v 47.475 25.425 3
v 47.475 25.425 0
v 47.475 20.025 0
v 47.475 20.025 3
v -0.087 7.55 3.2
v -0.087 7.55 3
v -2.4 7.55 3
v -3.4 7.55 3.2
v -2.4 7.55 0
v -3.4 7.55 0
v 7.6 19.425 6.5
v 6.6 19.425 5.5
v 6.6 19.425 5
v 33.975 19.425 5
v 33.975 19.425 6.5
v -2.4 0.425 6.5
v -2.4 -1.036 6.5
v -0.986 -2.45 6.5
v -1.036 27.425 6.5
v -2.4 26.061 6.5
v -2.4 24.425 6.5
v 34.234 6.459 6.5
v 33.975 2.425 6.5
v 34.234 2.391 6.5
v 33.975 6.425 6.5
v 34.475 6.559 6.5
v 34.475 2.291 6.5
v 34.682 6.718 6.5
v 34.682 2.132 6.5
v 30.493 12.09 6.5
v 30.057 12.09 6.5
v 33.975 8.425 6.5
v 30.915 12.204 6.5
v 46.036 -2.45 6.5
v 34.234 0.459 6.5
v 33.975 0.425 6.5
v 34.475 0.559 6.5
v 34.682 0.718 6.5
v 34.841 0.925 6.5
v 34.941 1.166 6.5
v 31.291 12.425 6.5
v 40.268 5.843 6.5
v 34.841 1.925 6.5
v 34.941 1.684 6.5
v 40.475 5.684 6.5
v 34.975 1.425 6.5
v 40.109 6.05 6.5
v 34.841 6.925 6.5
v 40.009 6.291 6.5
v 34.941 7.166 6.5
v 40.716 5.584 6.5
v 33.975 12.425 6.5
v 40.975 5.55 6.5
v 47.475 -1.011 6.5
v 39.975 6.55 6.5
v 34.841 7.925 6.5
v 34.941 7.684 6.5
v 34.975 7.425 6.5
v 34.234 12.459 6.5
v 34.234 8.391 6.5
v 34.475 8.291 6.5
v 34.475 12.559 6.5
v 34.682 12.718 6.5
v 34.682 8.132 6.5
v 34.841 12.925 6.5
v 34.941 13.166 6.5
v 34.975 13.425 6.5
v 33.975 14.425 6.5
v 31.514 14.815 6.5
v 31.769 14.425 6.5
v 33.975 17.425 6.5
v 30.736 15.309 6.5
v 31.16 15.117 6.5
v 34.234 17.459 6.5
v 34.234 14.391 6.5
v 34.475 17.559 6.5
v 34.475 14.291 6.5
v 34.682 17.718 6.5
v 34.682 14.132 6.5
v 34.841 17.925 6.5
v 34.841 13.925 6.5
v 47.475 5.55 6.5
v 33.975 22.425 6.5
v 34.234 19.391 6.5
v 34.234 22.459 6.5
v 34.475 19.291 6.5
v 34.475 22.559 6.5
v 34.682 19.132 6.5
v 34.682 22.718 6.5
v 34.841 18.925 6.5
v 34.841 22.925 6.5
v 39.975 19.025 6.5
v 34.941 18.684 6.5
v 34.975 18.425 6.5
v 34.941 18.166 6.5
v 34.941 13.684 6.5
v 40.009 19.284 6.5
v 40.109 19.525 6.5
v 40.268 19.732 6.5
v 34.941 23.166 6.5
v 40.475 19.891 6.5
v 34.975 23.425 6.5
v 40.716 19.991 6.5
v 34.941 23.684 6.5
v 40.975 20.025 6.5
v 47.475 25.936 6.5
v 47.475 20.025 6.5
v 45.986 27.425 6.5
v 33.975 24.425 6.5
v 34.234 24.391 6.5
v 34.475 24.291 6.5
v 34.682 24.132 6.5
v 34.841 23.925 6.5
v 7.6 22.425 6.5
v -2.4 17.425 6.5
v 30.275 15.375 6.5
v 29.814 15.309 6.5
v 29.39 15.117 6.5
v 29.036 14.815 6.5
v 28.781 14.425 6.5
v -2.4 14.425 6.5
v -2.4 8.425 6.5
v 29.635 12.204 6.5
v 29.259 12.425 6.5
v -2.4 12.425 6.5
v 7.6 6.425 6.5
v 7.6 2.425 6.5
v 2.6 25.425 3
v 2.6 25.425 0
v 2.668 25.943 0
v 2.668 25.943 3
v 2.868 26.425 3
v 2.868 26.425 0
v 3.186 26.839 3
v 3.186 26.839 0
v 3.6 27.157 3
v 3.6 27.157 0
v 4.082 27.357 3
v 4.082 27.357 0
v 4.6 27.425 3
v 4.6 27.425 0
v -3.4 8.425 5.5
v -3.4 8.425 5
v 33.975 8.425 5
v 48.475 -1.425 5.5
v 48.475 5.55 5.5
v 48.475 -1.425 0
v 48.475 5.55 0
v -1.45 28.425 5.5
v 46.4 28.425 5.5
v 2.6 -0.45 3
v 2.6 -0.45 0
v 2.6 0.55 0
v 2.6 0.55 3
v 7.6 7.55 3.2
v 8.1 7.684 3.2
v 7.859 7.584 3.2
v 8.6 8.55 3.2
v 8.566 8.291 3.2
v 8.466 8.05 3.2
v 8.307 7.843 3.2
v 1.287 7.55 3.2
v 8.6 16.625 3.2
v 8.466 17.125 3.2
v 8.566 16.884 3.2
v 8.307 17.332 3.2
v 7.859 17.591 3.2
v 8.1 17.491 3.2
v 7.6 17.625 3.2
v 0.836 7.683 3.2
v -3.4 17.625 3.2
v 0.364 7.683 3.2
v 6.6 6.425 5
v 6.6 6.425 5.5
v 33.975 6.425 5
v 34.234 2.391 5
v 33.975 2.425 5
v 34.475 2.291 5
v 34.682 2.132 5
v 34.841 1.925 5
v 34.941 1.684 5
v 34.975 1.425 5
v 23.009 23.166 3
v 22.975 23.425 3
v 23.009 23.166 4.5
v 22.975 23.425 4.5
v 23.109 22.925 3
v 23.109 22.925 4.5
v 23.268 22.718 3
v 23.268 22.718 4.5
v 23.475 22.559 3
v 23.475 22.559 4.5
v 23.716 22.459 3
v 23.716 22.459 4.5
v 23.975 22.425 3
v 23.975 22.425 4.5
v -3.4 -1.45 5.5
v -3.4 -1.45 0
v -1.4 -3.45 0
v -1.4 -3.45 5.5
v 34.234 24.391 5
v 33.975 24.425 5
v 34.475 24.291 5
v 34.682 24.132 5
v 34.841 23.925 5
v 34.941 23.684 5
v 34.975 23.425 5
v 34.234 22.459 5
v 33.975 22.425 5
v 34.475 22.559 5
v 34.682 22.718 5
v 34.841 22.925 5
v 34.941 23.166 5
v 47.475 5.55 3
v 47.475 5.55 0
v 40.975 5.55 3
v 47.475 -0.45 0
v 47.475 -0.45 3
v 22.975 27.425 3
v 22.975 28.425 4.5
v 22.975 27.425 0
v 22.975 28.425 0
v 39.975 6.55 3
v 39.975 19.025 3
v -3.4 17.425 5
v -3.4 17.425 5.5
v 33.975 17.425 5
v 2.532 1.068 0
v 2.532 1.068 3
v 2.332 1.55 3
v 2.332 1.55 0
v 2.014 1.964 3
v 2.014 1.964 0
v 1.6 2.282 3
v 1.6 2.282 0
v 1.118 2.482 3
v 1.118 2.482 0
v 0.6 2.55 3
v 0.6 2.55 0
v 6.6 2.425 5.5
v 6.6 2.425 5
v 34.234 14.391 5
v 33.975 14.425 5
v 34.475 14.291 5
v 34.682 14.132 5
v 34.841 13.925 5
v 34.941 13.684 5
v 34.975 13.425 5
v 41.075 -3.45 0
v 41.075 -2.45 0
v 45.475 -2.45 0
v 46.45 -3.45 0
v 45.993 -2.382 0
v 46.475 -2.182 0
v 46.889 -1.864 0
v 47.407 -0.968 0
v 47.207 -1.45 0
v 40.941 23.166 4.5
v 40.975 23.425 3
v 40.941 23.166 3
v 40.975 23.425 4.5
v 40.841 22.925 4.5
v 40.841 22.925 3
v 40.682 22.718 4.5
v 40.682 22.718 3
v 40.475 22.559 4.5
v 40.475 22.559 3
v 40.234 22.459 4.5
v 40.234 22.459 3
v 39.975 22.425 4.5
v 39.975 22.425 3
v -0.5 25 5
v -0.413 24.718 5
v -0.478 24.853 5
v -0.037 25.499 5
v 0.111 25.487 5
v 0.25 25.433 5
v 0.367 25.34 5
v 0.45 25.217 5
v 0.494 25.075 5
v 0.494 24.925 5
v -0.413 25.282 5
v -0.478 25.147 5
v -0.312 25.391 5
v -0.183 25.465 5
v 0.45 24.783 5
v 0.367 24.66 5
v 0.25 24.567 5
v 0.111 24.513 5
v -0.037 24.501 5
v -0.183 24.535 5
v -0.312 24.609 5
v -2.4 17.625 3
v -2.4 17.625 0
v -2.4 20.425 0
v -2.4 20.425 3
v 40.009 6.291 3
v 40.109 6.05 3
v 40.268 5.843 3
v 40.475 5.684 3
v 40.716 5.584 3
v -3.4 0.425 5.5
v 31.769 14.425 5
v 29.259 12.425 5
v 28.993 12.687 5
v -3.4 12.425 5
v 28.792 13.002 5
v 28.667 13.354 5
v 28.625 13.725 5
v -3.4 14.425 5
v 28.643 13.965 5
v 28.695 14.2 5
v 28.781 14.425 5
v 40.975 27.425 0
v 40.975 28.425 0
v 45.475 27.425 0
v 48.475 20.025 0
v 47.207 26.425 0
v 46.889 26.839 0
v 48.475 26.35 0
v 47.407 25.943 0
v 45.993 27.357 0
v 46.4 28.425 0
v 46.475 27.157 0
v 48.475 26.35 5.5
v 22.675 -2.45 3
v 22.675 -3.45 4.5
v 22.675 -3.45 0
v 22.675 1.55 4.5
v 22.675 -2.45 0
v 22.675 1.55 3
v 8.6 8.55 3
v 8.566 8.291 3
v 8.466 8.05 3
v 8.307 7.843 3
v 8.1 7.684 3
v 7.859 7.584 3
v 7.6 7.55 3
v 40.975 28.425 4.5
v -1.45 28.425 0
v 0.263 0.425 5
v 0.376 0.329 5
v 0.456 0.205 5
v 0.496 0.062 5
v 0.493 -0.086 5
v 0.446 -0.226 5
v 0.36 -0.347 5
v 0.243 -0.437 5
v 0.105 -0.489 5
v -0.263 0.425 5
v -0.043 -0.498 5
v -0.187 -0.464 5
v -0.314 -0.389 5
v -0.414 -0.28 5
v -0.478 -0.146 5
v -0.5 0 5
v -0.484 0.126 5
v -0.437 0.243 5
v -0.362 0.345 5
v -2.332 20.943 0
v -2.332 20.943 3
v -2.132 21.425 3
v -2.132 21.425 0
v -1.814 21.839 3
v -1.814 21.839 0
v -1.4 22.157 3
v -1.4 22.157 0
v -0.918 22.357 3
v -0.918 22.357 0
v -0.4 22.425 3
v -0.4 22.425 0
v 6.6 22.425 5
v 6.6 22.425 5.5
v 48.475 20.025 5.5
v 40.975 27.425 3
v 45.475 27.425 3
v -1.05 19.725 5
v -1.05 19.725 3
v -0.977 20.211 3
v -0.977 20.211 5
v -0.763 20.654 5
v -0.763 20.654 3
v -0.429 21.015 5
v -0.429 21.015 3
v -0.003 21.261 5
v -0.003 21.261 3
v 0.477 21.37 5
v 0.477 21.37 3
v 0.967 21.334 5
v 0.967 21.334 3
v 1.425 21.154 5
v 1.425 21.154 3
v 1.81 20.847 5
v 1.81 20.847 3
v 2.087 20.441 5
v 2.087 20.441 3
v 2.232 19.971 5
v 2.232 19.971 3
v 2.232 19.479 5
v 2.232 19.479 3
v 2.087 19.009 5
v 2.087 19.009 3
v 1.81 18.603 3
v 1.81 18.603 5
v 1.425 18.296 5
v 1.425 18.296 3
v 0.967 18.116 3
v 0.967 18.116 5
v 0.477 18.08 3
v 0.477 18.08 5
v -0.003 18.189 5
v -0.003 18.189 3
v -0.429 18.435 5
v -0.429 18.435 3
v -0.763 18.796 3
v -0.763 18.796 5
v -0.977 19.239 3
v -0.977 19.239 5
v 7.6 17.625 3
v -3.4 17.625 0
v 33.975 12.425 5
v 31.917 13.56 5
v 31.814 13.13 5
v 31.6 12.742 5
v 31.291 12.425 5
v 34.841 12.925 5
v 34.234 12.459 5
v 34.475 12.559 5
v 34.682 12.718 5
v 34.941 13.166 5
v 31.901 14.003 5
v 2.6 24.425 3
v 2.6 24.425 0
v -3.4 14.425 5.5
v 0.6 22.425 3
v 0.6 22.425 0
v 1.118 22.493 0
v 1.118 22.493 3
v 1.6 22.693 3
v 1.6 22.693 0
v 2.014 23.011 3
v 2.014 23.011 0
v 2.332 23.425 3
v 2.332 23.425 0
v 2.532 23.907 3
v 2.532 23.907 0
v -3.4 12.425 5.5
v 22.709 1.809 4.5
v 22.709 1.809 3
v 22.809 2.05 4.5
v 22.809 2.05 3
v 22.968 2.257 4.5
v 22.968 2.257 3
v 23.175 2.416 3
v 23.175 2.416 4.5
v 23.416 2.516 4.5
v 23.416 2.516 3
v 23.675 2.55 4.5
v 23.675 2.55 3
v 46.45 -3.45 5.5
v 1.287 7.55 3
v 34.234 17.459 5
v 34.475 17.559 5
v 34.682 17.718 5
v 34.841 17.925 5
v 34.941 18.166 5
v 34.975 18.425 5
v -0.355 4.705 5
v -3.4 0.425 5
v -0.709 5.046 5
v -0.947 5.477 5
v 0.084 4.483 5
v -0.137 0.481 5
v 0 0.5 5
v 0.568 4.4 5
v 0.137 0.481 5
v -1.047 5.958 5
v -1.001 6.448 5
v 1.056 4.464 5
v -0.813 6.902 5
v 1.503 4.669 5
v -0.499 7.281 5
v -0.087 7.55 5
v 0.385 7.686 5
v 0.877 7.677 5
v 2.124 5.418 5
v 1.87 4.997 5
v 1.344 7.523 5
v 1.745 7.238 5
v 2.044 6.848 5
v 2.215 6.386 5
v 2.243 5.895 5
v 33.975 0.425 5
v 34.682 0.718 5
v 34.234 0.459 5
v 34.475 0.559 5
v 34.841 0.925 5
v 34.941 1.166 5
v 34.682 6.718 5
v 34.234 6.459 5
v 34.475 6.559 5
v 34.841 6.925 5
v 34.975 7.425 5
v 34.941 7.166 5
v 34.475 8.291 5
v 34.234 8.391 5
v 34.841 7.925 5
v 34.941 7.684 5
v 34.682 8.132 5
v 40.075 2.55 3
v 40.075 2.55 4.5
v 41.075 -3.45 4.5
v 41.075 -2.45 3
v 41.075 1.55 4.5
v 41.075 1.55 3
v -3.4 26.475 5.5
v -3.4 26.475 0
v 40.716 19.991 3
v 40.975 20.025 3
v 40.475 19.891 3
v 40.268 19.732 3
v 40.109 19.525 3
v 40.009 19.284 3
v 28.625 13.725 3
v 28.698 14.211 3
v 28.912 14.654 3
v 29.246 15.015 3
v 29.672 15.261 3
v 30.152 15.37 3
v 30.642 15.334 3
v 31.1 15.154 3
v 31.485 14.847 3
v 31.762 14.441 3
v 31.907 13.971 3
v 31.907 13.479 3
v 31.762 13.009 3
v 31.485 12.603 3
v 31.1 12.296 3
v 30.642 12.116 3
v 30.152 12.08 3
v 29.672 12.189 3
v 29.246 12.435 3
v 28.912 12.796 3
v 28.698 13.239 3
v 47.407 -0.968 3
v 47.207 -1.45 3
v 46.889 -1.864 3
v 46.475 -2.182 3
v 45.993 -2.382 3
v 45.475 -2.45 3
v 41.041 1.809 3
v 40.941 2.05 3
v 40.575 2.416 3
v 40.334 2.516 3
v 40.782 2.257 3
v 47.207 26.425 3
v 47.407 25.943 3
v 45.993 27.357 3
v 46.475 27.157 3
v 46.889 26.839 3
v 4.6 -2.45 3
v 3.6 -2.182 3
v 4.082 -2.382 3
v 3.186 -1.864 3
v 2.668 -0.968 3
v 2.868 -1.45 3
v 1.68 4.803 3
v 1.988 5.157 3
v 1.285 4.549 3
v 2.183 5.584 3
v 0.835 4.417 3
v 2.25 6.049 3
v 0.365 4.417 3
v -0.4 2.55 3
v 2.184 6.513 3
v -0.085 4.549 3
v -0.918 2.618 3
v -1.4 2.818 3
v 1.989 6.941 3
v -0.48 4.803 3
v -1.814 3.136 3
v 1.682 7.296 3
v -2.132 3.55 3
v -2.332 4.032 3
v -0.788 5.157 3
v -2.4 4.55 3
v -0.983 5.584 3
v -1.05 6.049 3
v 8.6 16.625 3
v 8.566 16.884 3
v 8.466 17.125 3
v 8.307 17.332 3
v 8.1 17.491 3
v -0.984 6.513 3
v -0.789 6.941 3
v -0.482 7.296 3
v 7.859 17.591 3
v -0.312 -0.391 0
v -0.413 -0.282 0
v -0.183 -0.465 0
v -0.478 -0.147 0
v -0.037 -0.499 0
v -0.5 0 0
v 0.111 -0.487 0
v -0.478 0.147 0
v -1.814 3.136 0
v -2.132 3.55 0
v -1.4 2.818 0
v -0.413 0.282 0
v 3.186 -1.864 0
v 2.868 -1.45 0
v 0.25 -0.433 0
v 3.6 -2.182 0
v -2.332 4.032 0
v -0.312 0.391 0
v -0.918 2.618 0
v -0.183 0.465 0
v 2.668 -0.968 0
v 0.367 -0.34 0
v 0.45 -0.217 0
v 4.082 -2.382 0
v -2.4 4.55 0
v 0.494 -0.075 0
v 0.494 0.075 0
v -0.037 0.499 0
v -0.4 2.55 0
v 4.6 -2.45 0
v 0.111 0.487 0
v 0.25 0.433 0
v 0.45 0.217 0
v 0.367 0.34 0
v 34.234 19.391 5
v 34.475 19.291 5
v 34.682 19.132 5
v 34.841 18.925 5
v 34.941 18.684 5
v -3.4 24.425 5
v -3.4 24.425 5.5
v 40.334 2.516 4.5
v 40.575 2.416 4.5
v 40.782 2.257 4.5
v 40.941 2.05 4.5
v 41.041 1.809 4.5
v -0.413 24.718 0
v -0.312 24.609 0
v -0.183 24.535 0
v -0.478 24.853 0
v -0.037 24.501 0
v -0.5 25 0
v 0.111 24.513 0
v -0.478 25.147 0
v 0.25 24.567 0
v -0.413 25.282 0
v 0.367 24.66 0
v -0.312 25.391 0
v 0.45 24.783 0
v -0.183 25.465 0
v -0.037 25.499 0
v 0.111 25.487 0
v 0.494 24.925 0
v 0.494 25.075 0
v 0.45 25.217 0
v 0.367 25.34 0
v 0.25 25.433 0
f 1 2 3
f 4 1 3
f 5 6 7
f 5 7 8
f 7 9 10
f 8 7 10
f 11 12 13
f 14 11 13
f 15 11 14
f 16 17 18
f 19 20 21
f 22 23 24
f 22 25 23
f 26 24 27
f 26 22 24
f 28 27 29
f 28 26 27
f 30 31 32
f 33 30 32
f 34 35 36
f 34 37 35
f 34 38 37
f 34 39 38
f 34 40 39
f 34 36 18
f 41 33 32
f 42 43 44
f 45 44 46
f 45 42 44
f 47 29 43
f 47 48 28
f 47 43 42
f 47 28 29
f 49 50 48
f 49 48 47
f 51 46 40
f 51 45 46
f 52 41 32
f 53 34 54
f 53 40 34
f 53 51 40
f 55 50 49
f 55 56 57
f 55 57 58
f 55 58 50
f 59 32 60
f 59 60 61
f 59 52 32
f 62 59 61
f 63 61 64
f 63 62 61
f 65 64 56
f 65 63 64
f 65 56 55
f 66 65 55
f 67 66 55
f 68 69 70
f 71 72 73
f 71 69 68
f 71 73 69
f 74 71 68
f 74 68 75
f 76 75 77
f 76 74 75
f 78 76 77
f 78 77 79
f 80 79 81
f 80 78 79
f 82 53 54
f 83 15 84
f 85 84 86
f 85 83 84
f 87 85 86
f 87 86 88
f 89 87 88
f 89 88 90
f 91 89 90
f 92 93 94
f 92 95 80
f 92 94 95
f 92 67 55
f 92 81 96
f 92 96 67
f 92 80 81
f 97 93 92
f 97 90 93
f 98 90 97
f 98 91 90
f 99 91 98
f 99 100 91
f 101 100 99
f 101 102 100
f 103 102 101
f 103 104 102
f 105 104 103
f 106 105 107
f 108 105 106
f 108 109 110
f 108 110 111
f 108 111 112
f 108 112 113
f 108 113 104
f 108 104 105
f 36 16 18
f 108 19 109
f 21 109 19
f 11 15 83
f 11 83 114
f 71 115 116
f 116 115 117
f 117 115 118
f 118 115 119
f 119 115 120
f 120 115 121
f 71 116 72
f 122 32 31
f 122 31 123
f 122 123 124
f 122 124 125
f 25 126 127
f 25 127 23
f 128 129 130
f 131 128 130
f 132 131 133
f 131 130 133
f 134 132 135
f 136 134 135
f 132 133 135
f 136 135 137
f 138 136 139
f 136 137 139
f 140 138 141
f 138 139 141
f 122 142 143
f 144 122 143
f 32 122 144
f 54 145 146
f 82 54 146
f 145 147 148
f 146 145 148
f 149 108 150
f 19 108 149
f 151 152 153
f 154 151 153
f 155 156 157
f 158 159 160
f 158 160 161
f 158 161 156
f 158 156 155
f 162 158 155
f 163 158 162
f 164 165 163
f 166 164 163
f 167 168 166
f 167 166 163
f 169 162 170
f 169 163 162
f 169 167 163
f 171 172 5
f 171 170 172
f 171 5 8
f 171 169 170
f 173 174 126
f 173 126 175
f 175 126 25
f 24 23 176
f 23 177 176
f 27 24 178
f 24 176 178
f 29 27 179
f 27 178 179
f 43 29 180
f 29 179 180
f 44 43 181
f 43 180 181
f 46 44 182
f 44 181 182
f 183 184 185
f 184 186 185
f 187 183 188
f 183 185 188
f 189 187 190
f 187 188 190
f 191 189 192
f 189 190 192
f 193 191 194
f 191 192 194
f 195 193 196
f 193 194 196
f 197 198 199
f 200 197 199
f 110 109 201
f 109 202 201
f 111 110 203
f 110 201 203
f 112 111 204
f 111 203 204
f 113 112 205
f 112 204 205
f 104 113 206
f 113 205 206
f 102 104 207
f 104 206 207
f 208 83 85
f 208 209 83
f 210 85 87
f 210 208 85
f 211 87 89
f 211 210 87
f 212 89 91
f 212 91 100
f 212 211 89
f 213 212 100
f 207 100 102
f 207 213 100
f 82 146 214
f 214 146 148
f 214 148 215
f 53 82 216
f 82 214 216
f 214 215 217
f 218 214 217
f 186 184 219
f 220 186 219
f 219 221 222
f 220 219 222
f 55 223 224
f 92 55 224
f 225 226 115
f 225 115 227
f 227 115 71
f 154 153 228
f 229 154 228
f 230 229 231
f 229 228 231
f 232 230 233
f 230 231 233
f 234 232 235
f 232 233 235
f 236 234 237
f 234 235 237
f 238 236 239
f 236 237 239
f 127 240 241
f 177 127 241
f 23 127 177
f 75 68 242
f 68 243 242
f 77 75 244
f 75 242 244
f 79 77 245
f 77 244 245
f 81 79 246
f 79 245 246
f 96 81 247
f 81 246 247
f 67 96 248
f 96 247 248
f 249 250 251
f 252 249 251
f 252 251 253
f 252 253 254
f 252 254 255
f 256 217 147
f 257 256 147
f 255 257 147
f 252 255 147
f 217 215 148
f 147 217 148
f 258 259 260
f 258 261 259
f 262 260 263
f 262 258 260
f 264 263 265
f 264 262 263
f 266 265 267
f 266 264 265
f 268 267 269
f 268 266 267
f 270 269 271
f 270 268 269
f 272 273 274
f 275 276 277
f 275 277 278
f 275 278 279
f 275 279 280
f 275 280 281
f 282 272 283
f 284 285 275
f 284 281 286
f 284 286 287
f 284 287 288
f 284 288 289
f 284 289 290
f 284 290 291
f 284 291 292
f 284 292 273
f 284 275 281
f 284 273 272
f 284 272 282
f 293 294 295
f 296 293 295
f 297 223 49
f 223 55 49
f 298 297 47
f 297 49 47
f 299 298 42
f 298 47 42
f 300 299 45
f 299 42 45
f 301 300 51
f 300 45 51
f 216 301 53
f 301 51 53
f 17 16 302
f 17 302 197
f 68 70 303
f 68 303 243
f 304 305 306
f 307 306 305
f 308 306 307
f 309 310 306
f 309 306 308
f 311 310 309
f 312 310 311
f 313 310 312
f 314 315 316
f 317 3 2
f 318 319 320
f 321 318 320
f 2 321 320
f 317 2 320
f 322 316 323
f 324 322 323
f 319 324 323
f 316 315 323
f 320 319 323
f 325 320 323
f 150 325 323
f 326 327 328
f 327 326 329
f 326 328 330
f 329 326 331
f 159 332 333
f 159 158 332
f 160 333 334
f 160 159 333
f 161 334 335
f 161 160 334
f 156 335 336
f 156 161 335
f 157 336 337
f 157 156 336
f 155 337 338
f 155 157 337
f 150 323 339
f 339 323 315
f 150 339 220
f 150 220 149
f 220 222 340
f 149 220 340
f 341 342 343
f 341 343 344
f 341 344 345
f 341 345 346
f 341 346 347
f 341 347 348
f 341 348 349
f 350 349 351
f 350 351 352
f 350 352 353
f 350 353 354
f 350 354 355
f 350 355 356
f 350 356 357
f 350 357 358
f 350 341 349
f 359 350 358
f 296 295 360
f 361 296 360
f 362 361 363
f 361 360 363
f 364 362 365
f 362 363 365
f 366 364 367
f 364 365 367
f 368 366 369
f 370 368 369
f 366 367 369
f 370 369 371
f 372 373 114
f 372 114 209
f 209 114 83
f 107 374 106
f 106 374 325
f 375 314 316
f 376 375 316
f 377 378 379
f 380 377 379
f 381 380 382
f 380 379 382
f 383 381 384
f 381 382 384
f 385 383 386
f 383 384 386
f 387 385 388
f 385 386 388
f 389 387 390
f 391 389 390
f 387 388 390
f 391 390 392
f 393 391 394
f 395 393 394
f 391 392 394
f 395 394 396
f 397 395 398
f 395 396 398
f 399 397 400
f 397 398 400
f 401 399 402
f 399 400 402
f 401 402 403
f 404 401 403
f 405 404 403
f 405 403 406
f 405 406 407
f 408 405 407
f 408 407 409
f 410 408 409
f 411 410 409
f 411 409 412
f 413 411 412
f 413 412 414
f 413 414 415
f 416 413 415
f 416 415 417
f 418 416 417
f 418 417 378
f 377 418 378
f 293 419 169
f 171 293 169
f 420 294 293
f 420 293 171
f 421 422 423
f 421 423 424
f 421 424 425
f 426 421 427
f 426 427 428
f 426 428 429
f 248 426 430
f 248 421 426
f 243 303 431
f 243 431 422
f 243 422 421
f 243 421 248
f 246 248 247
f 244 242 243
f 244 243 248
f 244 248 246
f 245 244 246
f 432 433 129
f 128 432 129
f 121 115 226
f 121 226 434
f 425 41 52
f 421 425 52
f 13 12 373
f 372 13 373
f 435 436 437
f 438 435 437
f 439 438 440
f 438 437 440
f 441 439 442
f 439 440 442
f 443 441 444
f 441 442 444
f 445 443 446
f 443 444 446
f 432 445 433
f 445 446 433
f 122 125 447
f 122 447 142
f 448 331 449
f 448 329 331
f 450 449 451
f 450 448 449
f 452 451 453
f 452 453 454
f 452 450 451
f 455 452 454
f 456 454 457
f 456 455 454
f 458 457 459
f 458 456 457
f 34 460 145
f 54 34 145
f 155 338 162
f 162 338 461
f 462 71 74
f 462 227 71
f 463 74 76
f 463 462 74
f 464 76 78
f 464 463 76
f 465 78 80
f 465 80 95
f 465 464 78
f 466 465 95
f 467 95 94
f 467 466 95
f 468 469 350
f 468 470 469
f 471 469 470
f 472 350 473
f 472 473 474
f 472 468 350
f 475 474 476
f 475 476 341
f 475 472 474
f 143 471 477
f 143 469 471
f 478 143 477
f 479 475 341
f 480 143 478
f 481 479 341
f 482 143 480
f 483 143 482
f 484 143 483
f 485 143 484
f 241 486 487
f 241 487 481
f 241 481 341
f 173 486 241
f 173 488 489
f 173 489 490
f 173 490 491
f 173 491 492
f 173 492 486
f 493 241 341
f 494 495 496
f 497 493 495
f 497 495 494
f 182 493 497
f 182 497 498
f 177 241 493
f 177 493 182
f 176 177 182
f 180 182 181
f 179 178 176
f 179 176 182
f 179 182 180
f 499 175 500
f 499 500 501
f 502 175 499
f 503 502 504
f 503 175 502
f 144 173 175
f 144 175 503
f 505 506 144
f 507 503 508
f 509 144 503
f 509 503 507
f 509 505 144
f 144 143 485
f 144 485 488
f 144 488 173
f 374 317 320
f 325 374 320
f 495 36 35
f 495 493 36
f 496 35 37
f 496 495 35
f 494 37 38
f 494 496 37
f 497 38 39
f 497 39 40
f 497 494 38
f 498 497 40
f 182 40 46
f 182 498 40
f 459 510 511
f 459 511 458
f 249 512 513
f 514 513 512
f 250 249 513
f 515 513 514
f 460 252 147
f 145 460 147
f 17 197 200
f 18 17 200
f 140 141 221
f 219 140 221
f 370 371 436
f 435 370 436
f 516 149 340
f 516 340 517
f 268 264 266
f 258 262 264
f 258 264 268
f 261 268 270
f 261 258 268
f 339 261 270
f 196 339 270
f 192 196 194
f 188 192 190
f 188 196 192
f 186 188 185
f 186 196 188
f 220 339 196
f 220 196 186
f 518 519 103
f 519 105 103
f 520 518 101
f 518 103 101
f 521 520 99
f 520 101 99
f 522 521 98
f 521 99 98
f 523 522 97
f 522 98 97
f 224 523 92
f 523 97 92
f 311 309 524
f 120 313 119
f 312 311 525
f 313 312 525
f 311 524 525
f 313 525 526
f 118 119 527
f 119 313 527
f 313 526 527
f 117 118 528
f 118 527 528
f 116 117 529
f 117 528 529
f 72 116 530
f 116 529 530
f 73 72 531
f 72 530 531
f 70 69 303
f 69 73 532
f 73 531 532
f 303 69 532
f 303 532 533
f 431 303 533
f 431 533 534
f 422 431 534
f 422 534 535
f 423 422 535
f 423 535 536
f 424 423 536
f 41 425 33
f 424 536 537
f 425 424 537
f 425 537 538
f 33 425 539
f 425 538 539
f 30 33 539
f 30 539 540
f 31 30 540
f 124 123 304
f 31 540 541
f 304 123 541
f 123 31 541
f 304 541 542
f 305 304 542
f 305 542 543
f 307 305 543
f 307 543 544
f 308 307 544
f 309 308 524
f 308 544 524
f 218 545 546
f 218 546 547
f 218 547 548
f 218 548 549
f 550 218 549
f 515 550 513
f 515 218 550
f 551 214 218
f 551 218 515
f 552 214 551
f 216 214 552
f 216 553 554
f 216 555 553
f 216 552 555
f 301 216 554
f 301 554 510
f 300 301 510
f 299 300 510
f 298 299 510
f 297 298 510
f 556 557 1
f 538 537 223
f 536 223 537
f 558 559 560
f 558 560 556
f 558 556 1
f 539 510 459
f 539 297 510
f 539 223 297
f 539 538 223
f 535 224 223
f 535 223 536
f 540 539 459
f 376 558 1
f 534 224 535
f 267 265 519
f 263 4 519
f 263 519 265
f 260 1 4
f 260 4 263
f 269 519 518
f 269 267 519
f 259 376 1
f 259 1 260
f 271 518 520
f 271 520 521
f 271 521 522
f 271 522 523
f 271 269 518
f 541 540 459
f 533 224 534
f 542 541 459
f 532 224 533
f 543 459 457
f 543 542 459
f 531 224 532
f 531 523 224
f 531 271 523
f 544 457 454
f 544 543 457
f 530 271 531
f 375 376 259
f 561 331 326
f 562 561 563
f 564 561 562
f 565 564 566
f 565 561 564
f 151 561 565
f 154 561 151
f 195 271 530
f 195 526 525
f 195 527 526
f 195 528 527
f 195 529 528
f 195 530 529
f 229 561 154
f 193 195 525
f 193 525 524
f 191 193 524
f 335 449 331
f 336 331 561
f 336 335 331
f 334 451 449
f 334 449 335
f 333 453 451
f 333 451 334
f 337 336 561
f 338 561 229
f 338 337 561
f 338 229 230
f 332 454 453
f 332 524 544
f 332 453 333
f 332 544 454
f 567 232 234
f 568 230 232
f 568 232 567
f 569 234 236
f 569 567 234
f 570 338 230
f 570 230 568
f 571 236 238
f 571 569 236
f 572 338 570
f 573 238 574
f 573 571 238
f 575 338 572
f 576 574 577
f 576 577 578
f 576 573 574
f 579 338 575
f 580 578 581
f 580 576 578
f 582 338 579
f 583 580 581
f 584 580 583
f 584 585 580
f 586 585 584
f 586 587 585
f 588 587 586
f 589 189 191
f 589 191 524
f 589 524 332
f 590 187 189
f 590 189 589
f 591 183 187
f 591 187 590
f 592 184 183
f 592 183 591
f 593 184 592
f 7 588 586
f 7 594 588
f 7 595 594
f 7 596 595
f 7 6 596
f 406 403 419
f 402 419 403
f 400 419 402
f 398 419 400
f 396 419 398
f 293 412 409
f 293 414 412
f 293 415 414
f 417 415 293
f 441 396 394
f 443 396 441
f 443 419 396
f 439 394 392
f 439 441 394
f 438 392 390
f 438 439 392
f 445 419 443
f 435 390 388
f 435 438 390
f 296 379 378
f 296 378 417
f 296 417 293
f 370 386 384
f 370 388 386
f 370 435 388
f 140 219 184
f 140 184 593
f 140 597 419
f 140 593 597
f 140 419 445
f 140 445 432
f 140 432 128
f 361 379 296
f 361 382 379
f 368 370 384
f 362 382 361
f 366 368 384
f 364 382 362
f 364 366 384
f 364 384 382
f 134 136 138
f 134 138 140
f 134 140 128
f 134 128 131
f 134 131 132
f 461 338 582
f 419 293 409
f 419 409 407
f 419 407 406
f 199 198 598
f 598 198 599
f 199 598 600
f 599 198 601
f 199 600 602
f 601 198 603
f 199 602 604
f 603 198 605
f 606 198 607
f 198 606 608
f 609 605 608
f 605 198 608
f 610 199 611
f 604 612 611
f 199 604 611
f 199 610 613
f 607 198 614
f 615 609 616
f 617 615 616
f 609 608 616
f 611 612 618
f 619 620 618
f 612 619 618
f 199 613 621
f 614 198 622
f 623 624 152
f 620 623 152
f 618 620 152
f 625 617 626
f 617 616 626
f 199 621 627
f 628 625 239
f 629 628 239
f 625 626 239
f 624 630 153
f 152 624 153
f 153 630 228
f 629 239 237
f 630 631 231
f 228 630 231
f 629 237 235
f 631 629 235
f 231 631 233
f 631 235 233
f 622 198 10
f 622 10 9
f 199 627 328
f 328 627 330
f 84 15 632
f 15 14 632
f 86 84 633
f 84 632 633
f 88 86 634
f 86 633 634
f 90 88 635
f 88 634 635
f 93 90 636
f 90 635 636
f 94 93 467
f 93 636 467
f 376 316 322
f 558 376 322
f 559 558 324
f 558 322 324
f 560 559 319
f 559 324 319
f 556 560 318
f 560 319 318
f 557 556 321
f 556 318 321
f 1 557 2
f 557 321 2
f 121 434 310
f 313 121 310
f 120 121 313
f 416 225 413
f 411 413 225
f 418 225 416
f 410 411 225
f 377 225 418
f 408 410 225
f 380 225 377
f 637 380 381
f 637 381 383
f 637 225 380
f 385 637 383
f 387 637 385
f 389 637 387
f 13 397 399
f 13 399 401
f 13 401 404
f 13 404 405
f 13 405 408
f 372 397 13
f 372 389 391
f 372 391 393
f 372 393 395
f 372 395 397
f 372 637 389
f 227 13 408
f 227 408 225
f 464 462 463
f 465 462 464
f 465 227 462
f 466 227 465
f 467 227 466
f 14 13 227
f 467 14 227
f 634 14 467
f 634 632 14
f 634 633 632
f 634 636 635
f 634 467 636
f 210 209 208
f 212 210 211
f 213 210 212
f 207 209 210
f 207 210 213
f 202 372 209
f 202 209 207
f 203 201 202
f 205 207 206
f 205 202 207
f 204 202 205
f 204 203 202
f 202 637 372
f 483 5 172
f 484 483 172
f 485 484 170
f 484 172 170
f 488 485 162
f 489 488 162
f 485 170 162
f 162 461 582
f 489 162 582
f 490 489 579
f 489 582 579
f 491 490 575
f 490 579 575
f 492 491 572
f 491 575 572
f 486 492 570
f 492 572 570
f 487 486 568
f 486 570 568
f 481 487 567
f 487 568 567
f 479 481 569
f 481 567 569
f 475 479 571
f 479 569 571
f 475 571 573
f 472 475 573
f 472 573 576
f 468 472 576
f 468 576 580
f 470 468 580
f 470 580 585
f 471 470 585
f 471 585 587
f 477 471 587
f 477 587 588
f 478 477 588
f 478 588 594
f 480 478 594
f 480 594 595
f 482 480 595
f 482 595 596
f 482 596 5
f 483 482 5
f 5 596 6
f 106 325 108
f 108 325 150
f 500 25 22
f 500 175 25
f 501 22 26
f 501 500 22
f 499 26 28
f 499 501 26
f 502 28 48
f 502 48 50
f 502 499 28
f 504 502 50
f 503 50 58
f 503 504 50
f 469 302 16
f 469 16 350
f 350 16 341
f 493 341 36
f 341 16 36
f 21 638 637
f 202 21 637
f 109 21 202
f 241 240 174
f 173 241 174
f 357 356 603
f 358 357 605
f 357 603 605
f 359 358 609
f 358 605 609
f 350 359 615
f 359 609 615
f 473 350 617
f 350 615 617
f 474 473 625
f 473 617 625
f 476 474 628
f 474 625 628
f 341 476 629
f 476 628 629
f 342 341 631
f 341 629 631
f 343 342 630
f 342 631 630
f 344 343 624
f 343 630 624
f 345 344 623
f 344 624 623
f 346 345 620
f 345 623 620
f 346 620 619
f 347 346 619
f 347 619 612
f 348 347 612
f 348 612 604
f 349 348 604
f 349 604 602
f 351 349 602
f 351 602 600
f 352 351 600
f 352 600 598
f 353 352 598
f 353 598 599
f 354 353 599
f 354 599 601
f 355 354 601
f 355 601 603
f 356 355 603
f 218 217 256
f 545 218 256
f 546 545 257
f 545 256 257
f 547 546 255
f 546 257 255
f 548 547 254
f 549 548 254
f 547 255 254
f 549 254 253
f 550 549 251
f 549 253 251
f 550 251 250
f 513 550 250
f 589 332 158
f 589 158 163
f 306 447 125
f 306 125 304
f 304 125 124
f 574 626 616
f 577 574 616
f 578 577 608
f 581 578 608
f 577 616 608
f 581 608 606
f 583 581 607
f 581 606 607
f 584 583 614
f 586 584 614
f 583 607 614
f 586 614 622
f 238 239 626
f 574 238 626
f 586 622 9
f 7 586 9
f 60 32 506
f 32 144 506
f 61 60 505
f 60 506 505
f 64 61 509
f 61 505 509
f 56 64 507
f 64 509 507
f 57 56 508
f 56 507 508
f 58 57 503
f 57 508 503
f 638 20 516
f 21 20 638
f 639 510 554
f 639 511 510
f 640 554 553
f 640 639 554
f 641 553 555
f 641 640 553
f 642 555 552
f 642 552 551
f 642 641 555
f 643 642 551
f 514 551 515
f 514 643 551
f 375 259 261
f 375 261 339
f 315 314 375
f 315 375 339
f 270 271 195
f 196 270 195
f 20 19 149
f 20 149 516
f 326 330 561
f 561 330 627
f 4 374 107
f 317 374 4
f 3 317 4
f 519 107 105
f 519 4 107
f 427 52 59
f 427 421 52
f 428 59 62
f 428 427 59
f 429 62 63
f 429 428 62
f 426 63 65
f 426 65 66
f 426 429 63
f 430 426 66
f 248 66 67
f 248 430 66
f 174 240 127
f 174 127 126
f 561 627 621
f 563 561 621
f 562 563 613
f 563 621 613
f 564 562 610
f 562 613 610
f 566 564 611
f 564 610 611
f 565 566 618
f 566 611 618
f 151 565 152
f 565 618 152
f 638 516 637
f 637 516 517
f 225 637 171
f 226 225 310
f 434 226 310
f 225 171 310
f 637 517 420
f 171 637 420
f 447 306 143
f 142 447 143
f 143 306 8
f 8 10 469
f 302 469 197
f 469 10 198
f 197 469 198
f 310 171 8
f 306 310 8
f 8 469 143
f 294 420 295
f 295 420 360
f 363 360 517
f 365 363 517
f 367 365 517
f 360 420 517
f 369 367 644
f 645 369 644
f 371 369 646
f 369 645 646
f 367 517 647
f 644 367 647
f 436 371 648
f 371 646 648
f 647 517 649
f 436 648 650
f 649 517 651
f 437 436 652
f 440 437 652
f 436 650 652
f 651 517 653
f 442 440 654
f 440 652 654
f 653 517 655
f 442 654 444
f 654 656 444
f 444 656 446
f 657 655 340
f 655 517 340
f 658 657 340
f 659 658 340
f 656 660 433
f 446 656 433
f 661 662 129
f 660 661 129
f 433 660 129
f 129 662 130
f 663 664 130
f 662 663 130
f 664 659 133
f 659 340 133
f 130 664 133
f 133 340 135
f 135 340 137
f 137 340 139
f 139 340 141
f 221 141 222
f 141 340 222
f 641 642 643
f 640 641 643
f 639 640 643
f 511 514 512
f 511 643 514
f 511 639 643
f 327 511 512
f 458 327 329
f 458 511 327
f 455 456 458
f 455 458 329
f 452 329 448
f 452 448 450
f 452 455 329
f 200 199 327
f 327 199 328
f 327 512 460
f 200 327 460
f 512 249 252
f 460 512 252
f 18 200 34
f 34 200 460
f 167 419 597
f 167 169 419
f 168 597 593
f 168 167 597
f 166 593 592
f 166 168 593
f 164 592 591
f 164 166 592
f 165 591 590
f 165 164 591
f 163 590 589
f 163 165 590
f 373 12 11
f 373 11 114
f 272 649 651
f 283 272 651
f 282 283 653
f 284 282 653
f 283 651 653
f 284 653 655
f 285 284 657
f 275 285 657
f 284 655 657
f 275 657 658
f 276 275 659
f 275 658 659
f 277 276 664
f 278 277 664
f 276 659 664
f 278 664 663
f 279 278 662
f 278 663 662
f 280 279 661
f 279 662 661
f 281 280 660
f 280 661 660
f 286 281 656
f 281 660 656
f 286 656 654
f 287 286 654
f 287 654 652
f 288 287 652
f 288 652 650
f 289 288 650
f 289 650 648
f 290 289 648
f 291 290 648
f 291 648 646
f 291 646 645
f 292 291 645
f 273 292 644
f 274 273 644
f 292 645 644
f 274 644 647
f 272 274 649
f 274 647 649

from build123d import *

# Parameters (mm, degrees)
EXTRUDE_2_DEPTH     = 6.5
CUT_EXTRUDE_1_DEPTH = 3
SKETCH_4_R          = 0.5
CUT_EXTRUDE_2_DEPTH = 5
SKETCH_5_W          = 10.662315839
SKETCH_5_H          = 14.474999285
CUT_EXTRUDE_3_DEPTH = 15
SKETCH_6_W          = 18
SKETCH_6_H          = 6.5630452
SKETCH_6_W_2        = 18.4
SKETCH_6_H_2        = 6.601696298
CUT_EXTRUDE_4_DEPTH = 4.5
SKETCH_8_W          = 13.913437684
SKETCH_8_H          = 10.074999285
CUT_EXTRUDE_5_DEPTH = 3.2
SKETCH_9_R          = 1.65
CUT_EXTRUDE_6_DEPTH = 23
CHAMFER_2_SIZE      = 1
FILLET_1_R          = 1
SKETCH_20_W         = 43.816957605
SKETCH_20_H         = 2
SKETCH_20_W_2       = 44.126249409
SKETCH_20_W_3       = 44.36192542
CUT_EXTRUDE_7_DEPTH = 1.5
FILLET_2_R          = 1
SKETCH_21_W         = 13.231285314
SKETCH_21_H         = 4.572576543
SKETCH_21_W_2       = 12.647552139
SKETCH_21_H_2       = 6.080553912
CUT_EXTRUDE_8_DEPTH = 1.5
CHAMFER_3_SIZE      = 1


with BuildPart() as part:
    # Эскиз2 → Бобышка-Вытянуть2 (new body)
    with BuildSketch(Plane.XY):
        Polygon((-1.450000048, 28.424999237), (-3.400000095, 26.475000381), (-3.400000095, -1.450000048), (-1.399999976, -3.450000048), (46.449998499, -3.450000048), (48.474998474, -1.424999952), (48.474998474, 26.350000381), (46.400001526, 28.424999237), align=None)
    extrude(amount=EXTRUDE_2_DEPTH)

    # Эскиз3 → Вырез-Вытянуть1 (cut)
    with BuildSketch(Plane(origin=(0, 0, 0), x_dir=(-1, 0, 0), z_dir=(0, 0, -1))):
        with BuildLine():
            Line((-45.474998474, -2.450000048), (-4.599999905, -2.450000048))
            ThreePointArc((-4.599999905, -2.450000048), (-3.185786342, -1.86421361), (-2.599999905, -0.450000048))
            Line((-2.599999905, -0.450000048), (-2.599999905, 0.549999952))
            ThreePointArc((-2.599999905, 0.549999952), (-2.014213467, 1.964213515), (-0.599999905, 2.549999952))
            Line((-0.599999905, 2.549999952), (0.400000095, 2.549999952))
            ThreePointArc((0.400000095, 2.549999952), (1.814213658, 3.13578639), (2.400000095, 4.549999952))
            Line((2.400000095, 4.549999952), (2.400000095, 20.424999237))
            ThreePointArc((2.400000095, 20.424999237), (1.814213658, 21.839212799), (0.400000095, 22.424999237))
            Line((0.400000095, 22.424999237), (-0.599999905, 22.424999237))
            ThreePointArc((-0.599999905, 22.424999237), (-2.014213467, 23.010785675), (-2.599999905, 24.424999237))
            Line((-2.599999905, 24.424999237), (-2.599999905, 25.424999237))
            ThreePointArc((-2.599999905, 25.424999237), (-3.185786342, 26.839212799), (-4.599999905, 27.424999237))
            Line((-4.599999905, 27.424999237), (-45.474998474, 27.424999237))
            ThreePointArc((-45.474998474, 27.424999237), (-46.889212036, 26.839212799), (-47.474998474, 25.424999237))
            Line((-47.474998474, 25.424999237), (-47.474998474, -0.450000048))
            ThreePointArc((-47.474998474, -0.450000048), (-46.889212036, -1.86421361), (-45.474998474, -2.450000048))
        make_face()
    extrude(amount=-CUT_EXTRUDE_1_DEPTH, mode=Mode.SUBTRACT)

    # Эскиз4 → Вырез-Вытянуть2 (cut)
    with BuildSketch(Plane(origin=(0, 0, 0), x_dir=(-1, 0, 0), z_dir=(0, 0, -1))):
        with Locations((0, 25)):
            Circle(SKETCH_4_R)
        Circle(SKETCH_4_R)
    extrude(amount=-CUT_EXTRUDE_2_DEPTH, mode=Mode.SUBTRACT)

    # Эскиз5 → Вырез-Вытянуть3 (cut)
    with BuildSketch(Plane(origin=(0, 0, 0), x_dir=(-1, 0, 0), z_dir=(0, 0, -1))):
        with Locations((-45.306156394, 12.787499595)):
            Rectangle(SKETCH_5_W, SKETCH_5_H)
    extrude(amount=-CUT_EXTRUDE_3_DEPTH, mode=Mode.SUBTRACT)

    # Эскиз6 → Вырез-Вытянуть4 (cut)
    with BuildSketch(Plane(origin=(0, 0, 0), x_dir=(-1, 0, 0), z_dir=(0, 0, -1))):
        with Locations((-31.974998474, 25.706521837)):
            Rectangle(SKETCH_6_W, SKETCH_6_H)
        with Locations((-31.874998474, -0.750848197)):
            Rectangle(SKETCH_6_W_2, SKETCH_6_H_2)
    extrude(amount=-CUT_EXTRUDE_4_DEPTH, mode=Mode.SUBTRACT)

    # Эскиз8 → Вырез-Вытянуть5 (cut)
    with BuildSketch(Plane(origin=(0, 0, 0), x_dir=(-1, 0, 0), z_dir=(0, 0, -1))):
        with Locations((-1.643281063, 12.587499595)):
            Rectangle(SKETCH_8_W, SKETCH_8_H)
    extrude(amount=-CUT_EXTRUDE_5_DEPTH, mode=Mode.SUBTRACT)

    # Эскиз9 → Вырез-Вытянуть6 (cut)
    with BuildSketch(Plane(origin=(0, 0, 3), x_dir=(-1, 0, 0), z_dir=(0, 0, -1))):
        with Locations((-30.274998474, 13.724999237)):
            Circle(SKETCH_9_R)
        with Locations((-0.599999905, 19.724999237)):
            Circle(SKETCH_9_R)
        with Locations(Location((-0.599999905, 6.049999952, 0), (0, 0, 65.380022671))):
            Circle(SKETCH_9_R)
    extrude(amount=-CUT_EXTRUDE_6_DEPTH, mode=Mode.SUBTRACT)

    # Фаска2
    chamfer_2_edges = [part.edges().sort_by_distance(p)[0] for p in [
        (-3.400000095, 12.512500167, 6.5),
        (-2.400000036, -2.450000048, 6.5),
        (22.524999262, -3.450000048, 6.5),
        (47.462498487, -2.4375, 6.5),
        (48.474998474, 2.0625, 6.5),
        (47.4375, 27.387499809, 6.5),
        (22.475000739, 28.424999237, 6.5),
        (48.474998474, 23.187499809, 6.5),
        (-2.425000072, 27.449999809, 6.5),
    ]]
    chamfer(chamfer_2_edges, length=CHAMFER_2_SIZE)

    # Скругление1
    fillet_1_edges = [part.edges().sort_by_distance(p)[0] for p in [
        (40.974998474, 22.424999237, 3.75),
        (22.974998474, 22.424999237, 3.75),
        (22.674998474, 2.549999952, 3.75),
        (41.074998474, 2.549999952, 3.75),
        (8.599999905, 17.624999237, 3.1),
        (8.599999905, 7.549999952, 3.1),
        (39.974998474, 5.549999952, 4.75),
        (39.974998474, 20.024999237, 4.75),
    ]]
    fillet(fillet_1_edges, radius=FILLET_1_R)

    # Эскиз20 → Вырез-Вытянуть7 (cut)
    with BuildSketch(Plane.XY.offset(6.5)):
        with Locations((13.066519672, 23.424999237)):
            Rectangle(SKETCH_20_W, SKETCH_20_H)
        with Locations((13.066519672, 13.424999237)):
            Rectangle(SKETCH_20_W, SKETCH_20_H)
        with Locations((12.91187377, 1.424999237)):
            Rectangle(SKETCH_20_W_2, SKETCH_20_H)
        with Locations((13.066519672, 7.424999237)):
            Rectangle(SKETCH_20_W, SKETCH_20_H)
        with Locations((12.794035764, 18.424999237)):
            Rectangle(SKETCH_20_W_3, SKETCH_20_H)
    extrude(amount=-CUT_EXTRUDE_7_DEPTH, mode=Mode.SUBTRACT)

    # Скругление2
    fillet_2_edges = [part.edges().sort_by_distance(p)[0] for p in [
        (34.974998474, 0.424999237, 5.75),
        (34.974998474, 6.424999237, 5.75),
        (34.974998474, 12.424999237, 5.75),
        (34.974998474, 17.424999237, 5.75),
        (34.974998474, 2.424999237, 5.75),
        (34.974998474, 8.424999237, 5.75),
        (34.974998474, 14.424999237, 5.75),
        (34.974998474, 19.424999237, 5.75),
        (34.974998474, 22.424999237, 5.75),
        (34.974998474, 24.424999237, 5.75),
    ]]
    fillet(fillet_2_edges, radius=FILLET_2_R - 0.0001)  # a hair under: the kernel refuses the full size

    # Эскиз21 → Вырез-Вытянуть8 (cut)
    with BuildSketch(Plane.XY.offset(6.5)):
        with Locations((-0.015642752, 20.906096965)):
            Rectangle(SKETCH_21_W, SKETCH_21_H)
        with Locations((0.276223836, 4.43995697)):
            Rectangle(SKETCH_21_W_2, SKETCH_21_H_2)
    extrude(amount=-CUT_EXTRUDE_8_DEPTH, mode=Mode.SUBTRACT)

    # Фаска3
    chamfer_3_edges = [part.edges().sort_by_distance(p)[0] for p in [
        (6.599999905, 20.924999237, 6.5),
        (6.599999905, 4.424999237, 6.5),
    ]]
    chamfer(chamfer_3_edges, length=CHAMFER_3_SIZE)


solid = part.part
